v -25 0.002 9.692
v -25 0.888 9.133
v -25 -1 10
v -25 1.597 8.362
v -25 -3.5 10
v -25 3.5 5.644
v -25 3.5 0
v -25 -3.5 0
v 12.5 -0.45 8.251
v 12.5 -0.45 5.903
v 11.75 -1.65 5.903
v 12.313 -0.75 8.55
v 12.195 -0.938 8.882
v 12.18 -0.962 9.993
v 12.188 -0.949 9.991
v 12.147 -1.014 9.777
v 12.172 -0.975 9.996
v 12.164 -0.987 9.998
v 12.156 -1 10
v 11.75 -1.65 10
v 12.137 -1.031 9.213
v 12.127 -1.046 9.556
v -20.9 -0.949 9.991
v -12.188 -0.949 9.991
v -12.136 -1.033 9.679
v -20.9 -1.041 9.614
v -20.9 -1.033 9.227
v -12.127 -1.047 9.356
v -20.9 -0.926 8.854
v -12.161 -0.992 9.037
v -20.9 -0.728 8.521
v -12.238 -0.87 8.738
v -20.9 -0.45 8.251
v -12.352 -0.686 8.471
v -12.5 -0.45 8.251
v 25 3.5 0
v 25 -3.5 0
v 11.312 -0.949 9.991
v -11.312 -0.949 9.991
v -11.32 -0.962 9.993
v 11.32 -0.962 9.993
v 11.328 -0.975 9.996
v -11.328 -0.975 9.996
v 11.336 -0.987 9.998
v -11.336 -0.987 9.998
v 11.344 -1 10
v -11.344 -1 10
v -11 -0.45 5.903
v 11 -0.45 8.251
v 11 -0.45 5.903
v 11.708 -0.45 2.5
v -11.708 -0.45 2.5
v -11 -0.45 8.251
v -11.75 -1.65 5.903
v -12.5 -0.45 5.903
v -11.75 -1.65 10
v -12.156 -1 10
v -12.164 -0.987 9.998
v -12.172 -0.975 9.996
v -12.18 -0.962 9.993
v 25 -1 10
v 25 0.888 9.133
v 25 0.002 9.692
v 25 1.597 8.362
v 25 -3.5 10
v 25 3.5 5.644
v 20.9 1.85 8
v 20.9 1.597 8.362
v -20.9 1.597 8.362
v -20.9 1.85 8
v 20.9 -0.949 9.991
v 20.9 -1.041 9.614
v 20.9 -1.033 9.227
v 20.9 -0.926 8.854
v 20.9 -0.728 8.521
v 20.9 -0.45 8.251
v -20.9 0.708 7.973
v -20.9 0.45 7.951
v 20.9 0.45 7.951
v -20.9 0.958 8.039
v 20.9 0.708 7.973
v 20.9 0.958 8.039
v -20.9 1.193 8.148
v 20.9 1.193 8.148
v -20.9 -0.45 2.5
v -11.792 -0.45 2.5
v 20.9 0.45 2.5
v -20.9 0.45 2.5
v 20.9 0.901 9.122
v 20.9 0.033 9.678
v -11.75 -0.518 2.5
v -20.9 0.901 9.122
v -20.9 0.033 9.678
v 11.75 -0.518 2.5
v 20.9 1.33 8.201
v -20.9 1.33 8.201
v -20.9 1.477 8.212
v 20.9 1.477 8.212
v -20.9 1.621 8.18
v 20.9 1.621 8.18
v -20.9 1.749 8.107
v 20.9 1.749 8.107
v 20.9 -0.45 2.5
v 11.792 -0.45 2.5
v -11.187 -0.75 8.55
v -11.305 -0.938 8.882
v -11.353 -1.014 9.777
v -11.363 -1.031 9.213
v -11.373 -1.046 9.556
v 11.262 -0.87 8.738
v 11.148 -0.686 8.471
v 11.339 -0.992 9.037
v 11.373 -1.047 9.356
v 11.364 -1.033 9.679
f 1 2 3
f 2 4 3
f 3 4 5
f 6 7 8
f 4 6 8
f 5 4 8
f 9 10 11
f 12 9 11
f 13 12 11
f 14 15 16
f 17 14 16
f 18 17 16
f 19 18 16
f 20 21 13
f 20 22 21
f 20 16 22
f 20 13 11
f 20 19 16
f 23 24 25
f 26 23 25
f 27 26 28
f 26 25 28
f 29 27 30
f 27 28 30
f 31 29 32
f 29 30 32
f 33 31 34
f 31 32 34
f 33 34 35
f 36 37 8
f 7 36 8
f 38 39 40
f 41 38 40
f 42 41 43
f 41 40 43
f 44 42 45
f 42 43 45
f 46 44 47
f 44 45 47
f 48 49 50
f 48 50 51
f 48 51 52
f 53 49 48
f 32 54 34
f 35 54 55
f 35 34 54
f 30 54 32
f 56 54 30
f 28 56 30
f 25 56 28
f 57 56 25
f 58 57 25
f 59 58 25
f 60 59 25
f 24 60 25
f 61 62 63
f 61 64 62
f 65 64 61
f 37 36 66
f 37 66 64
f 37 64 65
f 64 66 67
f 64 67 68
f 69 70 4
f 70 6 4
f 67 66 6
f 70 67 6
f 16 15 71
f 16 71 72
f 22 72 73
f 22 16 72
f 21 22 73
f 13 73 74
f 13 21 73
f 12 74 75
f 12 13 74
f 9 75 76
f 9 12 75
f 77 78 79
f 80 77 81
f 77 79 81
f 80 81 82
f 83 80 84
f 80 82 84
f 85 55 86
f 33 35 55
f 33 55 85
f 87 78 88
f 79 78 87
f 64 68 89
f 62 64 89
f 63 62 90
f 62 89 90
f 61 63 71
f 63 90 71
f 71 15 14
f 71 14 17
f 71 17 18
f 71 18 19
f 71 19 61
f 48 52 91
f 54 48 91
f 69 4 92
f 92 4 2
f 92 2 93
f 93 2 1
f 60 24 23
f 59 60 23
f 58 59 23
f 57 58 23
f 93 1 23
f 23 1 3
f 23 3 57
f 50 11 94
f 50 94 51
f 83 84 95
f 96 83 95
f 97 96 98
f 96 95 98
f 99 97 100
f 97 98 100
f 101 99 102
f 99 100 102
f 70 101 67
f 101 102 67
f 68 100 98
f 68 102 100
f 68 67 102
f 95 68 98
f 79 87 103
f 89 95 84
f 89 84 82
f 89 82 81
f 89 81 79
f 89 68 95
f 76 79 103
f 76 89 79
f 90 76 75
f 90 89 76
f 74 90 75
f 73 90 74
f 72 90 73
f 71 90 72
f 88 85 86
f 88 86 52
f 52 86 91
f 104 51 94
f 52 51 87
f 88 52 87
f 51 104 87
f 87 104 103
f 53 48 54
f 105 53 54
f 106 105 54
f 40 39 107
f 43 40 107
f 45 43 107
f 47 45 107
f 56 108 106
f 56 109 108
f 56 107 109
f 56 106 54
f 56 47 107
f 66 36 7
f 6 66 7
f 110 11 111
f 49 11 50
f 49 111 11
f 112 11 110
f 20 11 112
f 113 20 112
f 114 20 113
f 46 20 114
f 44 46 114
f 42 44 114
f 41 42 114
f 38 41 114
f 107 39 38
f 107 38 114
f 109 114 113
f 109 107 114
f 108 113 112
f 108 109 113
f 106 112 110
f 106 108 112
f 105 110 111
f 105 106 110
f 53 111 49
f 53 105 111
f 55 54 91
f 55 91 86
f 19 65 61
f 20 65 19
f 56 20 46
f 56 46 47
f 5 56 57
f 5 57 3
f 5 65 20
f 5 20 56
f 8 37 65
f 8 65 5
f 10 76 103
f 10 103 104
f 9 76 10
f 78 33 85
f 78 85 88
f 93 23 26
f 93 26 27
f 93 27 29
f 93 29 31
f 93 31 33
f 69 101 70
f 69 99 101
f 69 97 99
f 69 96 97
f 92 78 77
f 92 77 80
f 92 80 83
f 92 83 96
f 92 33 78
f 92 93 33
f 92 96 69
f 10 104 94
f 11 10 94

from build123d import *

# Parameters (mm, degrees)
SKETCH_1_W                         = 50
SKETCH_1_H                         = 7
EXTRUDE_1_DEPTH                    = 10
CUT_EXTRUDE_2_DEPTH                = 7.5
CHAMFER_2_SIZE                     = 0.6
CHAMFER_2_SIZE2                    = 3.402769092
CUT_EXTRUDE_1775_DEPTH             = 28.152347965
CUT_EXTRUDE_1775_DEPTH_BACK        = 28.152347965
CUT_EXTRUDE_1975_REACH             = 29.152
CUT_EXTRUDE_1975_DIRECTION_2_REACH = 29.152


with BuildPart() as part:
    # Эскиз1 → Бобышка-Вытянуть1 (new body)
    with BuildSketch(Plane(origin=(0, 66.754264805, 0), x_dir=(-1, 0, 0), z_dir=(0, 0, 1))):
        with Locations((0, 66.754264805)):
            Rectangle(SKETCH_1_W, SKETCH_1_H)
    extrude(amount=EXTRUDE_1_DEPTH)

    # Эскиз4 → Вырез-Вытянуть2 (cut)
    with BuildSketch(Plane(origin=(0, 66.754264805, 10), x_dir=(-1, 0, 0), z_dir=(0, 0, 1))):
        Polygon((-20.9, 67.204264805), (-12.5, 67.204264805), (-11.75, 68.404264805), (-11, 67.204264805), (11, 67.204264805), (11.75, 68.404264805), (12.5, 67.204264805), (20.9, 67.204264805), (20.9, 66.304264805), (-20.9, 66.304264805), align=None)
    extrude(amount=-CUT_EXTRUDE_2_DEPTH, mode=Mode.SUBTRACT)

    # Фаска2
    chamfer_2_edges = [part.edges().sort_by_distance(p)[0] for p in [
        (11.375, -1.05, 2.5),
        (-11.375, -1.05, 2.5),
        (-12.125, -1.05, 2.5),
        (12.125, -1.05, 2.5),
    ]]
    chamfer_2_side = [part.faces().sort_by_distance(p)[0] for p in [
        (0, -0.038812785, 2.5),
    ]]
    chamfer(chamfer_2_edges, length=CHAMFER_2_SIZE, length2=CHAMFER_2_SIZE2, reference=chamfer_2_side[0])

    # Эскиз5 → Cut-Extrude 1775 (cut, two sides: drawn at the far end of the back side and taken through both)
    with BuildSketch(Plane(origin=(0, 0, 0), x_dir=(0, 0, -1), z_dir=(1, 0, 0)).offset(-CUT_EXTRUDE_1775_DEPTH_BACK)):
        with BuildLine():
            Line((-10, -1), (-10, 3.5))
            Line((-10, 3.5), (-5.644148579, 3.5))
            Line((-5.644148579, 3.5), (-8.361695911, 1.597152873))
            ThreePointArc((-8.361695911, 1.597152873), (-9.442167509, 0.463418829), (-10, -1))
        make_face()
    extrude(amount=CUT_EXTRUDE_1775_DEPTH + CUT_EXTRUDE_1775_DEPTH_BACK, mode=Mode.SUBTRACT)

    # Cut-Extrude 1975: up to this face of the body (flat: up to its plane)
    cut_extrude_1975_end = Plane(part.part.faces().sort_by_distance((-20.9, -0.004333952, 6.091884202))[0])
    # Эскиз6 → Cut-Extrude 1975 (cut, up to the picked face)
    with BuildSketch(Plane(origin=(0, 0, 0), x_dir=(0, 0, -1), z_dir=(1, 0, 0)), mode=Mode.PRIVATE) as cut_extrude_1975_sk1:
        with BuildLine():
            Line((-8.00005385, 1.85037737), (-10.83265057, -0.133028206))
            ThreePointArc((-10.83265057, -0.133028206), (-8.786352952, -0.894909941), (-8.147597927, 1.193101011))
            ThreePointArc((-8.147597927, 1.193101011), (-8.201124989, 1.550315037), (-8.00005385, 1.85037737))
        make_face()
    cut_extrude_1975_tool1 = split(extrude(cut_extrude_1975_sk1.sketch, amount=-CUT_EXTRUDE_1975_REACH, mode=Mode.PRIVATE), bisect_by=cut_extrude_1975_end, keep=Keep.BOTH, mode=Mode.PRIVATE)
    add(cut_extrude_1975_tool1.solids().sort_by(Axis((0, 0.082385, 9.170045), (-1, 0, 0)))[0], mode=Mode.SUBTRACT)

    # Cut-Extrude 1975 direction 2: up to this face of the body (flat: up to its plane)
    cut_extrude_1975_direction_2_end = Plane(part.part.faces().sort_by_distance((20.9, -0.004333952, 6.091884202))[0])
    # Эскиз6 → Cut-Extrude 1975 direction 2 (cut, up to the picked face)
    with BuildSketch(Plane(origin=(0, 0, 0), x_dir=(0, 0, -1), z_dir=(1, 0, 0)), mode=Mode.PRIVATE) as cut_extrude_1975_direction_2_sk1:
        with BuildLine():
            Line((-8.00005385, 1.85037737), (-10.83265057, -0.133028206))
            ThreePointArc((-10.83265057, -0.133028206), (-8.786352952, -0.894909941), (-8.147597927, 1.193101011))
            ThreePointArc((-8.147597927, 1.193101011), (-8.201124989, 1.550315037), (-8.00005385, 1.85037737))
        make_face()
    cut_extrude_1975_direction_2_tool1 = split(extrude(cut_extrude_1975_direction_2_sk1.sketch, amount=CUT_EXTRUDE_1975_DIRECTION_2_REACH, mode=Mode.PRIVATE), bisect_by=cut_extrude_1975_direction_2_end, keep=Keep.BOTH, mode=Mode.PRIVATE)
    add(cut_extrude_1975_direction_2_tool1.solids().sort_by(Axis((0, 0.082385, 9.170045), (1, 0, 0)))[0], mode=Mode.SUBTRACT)


solid = part.part
